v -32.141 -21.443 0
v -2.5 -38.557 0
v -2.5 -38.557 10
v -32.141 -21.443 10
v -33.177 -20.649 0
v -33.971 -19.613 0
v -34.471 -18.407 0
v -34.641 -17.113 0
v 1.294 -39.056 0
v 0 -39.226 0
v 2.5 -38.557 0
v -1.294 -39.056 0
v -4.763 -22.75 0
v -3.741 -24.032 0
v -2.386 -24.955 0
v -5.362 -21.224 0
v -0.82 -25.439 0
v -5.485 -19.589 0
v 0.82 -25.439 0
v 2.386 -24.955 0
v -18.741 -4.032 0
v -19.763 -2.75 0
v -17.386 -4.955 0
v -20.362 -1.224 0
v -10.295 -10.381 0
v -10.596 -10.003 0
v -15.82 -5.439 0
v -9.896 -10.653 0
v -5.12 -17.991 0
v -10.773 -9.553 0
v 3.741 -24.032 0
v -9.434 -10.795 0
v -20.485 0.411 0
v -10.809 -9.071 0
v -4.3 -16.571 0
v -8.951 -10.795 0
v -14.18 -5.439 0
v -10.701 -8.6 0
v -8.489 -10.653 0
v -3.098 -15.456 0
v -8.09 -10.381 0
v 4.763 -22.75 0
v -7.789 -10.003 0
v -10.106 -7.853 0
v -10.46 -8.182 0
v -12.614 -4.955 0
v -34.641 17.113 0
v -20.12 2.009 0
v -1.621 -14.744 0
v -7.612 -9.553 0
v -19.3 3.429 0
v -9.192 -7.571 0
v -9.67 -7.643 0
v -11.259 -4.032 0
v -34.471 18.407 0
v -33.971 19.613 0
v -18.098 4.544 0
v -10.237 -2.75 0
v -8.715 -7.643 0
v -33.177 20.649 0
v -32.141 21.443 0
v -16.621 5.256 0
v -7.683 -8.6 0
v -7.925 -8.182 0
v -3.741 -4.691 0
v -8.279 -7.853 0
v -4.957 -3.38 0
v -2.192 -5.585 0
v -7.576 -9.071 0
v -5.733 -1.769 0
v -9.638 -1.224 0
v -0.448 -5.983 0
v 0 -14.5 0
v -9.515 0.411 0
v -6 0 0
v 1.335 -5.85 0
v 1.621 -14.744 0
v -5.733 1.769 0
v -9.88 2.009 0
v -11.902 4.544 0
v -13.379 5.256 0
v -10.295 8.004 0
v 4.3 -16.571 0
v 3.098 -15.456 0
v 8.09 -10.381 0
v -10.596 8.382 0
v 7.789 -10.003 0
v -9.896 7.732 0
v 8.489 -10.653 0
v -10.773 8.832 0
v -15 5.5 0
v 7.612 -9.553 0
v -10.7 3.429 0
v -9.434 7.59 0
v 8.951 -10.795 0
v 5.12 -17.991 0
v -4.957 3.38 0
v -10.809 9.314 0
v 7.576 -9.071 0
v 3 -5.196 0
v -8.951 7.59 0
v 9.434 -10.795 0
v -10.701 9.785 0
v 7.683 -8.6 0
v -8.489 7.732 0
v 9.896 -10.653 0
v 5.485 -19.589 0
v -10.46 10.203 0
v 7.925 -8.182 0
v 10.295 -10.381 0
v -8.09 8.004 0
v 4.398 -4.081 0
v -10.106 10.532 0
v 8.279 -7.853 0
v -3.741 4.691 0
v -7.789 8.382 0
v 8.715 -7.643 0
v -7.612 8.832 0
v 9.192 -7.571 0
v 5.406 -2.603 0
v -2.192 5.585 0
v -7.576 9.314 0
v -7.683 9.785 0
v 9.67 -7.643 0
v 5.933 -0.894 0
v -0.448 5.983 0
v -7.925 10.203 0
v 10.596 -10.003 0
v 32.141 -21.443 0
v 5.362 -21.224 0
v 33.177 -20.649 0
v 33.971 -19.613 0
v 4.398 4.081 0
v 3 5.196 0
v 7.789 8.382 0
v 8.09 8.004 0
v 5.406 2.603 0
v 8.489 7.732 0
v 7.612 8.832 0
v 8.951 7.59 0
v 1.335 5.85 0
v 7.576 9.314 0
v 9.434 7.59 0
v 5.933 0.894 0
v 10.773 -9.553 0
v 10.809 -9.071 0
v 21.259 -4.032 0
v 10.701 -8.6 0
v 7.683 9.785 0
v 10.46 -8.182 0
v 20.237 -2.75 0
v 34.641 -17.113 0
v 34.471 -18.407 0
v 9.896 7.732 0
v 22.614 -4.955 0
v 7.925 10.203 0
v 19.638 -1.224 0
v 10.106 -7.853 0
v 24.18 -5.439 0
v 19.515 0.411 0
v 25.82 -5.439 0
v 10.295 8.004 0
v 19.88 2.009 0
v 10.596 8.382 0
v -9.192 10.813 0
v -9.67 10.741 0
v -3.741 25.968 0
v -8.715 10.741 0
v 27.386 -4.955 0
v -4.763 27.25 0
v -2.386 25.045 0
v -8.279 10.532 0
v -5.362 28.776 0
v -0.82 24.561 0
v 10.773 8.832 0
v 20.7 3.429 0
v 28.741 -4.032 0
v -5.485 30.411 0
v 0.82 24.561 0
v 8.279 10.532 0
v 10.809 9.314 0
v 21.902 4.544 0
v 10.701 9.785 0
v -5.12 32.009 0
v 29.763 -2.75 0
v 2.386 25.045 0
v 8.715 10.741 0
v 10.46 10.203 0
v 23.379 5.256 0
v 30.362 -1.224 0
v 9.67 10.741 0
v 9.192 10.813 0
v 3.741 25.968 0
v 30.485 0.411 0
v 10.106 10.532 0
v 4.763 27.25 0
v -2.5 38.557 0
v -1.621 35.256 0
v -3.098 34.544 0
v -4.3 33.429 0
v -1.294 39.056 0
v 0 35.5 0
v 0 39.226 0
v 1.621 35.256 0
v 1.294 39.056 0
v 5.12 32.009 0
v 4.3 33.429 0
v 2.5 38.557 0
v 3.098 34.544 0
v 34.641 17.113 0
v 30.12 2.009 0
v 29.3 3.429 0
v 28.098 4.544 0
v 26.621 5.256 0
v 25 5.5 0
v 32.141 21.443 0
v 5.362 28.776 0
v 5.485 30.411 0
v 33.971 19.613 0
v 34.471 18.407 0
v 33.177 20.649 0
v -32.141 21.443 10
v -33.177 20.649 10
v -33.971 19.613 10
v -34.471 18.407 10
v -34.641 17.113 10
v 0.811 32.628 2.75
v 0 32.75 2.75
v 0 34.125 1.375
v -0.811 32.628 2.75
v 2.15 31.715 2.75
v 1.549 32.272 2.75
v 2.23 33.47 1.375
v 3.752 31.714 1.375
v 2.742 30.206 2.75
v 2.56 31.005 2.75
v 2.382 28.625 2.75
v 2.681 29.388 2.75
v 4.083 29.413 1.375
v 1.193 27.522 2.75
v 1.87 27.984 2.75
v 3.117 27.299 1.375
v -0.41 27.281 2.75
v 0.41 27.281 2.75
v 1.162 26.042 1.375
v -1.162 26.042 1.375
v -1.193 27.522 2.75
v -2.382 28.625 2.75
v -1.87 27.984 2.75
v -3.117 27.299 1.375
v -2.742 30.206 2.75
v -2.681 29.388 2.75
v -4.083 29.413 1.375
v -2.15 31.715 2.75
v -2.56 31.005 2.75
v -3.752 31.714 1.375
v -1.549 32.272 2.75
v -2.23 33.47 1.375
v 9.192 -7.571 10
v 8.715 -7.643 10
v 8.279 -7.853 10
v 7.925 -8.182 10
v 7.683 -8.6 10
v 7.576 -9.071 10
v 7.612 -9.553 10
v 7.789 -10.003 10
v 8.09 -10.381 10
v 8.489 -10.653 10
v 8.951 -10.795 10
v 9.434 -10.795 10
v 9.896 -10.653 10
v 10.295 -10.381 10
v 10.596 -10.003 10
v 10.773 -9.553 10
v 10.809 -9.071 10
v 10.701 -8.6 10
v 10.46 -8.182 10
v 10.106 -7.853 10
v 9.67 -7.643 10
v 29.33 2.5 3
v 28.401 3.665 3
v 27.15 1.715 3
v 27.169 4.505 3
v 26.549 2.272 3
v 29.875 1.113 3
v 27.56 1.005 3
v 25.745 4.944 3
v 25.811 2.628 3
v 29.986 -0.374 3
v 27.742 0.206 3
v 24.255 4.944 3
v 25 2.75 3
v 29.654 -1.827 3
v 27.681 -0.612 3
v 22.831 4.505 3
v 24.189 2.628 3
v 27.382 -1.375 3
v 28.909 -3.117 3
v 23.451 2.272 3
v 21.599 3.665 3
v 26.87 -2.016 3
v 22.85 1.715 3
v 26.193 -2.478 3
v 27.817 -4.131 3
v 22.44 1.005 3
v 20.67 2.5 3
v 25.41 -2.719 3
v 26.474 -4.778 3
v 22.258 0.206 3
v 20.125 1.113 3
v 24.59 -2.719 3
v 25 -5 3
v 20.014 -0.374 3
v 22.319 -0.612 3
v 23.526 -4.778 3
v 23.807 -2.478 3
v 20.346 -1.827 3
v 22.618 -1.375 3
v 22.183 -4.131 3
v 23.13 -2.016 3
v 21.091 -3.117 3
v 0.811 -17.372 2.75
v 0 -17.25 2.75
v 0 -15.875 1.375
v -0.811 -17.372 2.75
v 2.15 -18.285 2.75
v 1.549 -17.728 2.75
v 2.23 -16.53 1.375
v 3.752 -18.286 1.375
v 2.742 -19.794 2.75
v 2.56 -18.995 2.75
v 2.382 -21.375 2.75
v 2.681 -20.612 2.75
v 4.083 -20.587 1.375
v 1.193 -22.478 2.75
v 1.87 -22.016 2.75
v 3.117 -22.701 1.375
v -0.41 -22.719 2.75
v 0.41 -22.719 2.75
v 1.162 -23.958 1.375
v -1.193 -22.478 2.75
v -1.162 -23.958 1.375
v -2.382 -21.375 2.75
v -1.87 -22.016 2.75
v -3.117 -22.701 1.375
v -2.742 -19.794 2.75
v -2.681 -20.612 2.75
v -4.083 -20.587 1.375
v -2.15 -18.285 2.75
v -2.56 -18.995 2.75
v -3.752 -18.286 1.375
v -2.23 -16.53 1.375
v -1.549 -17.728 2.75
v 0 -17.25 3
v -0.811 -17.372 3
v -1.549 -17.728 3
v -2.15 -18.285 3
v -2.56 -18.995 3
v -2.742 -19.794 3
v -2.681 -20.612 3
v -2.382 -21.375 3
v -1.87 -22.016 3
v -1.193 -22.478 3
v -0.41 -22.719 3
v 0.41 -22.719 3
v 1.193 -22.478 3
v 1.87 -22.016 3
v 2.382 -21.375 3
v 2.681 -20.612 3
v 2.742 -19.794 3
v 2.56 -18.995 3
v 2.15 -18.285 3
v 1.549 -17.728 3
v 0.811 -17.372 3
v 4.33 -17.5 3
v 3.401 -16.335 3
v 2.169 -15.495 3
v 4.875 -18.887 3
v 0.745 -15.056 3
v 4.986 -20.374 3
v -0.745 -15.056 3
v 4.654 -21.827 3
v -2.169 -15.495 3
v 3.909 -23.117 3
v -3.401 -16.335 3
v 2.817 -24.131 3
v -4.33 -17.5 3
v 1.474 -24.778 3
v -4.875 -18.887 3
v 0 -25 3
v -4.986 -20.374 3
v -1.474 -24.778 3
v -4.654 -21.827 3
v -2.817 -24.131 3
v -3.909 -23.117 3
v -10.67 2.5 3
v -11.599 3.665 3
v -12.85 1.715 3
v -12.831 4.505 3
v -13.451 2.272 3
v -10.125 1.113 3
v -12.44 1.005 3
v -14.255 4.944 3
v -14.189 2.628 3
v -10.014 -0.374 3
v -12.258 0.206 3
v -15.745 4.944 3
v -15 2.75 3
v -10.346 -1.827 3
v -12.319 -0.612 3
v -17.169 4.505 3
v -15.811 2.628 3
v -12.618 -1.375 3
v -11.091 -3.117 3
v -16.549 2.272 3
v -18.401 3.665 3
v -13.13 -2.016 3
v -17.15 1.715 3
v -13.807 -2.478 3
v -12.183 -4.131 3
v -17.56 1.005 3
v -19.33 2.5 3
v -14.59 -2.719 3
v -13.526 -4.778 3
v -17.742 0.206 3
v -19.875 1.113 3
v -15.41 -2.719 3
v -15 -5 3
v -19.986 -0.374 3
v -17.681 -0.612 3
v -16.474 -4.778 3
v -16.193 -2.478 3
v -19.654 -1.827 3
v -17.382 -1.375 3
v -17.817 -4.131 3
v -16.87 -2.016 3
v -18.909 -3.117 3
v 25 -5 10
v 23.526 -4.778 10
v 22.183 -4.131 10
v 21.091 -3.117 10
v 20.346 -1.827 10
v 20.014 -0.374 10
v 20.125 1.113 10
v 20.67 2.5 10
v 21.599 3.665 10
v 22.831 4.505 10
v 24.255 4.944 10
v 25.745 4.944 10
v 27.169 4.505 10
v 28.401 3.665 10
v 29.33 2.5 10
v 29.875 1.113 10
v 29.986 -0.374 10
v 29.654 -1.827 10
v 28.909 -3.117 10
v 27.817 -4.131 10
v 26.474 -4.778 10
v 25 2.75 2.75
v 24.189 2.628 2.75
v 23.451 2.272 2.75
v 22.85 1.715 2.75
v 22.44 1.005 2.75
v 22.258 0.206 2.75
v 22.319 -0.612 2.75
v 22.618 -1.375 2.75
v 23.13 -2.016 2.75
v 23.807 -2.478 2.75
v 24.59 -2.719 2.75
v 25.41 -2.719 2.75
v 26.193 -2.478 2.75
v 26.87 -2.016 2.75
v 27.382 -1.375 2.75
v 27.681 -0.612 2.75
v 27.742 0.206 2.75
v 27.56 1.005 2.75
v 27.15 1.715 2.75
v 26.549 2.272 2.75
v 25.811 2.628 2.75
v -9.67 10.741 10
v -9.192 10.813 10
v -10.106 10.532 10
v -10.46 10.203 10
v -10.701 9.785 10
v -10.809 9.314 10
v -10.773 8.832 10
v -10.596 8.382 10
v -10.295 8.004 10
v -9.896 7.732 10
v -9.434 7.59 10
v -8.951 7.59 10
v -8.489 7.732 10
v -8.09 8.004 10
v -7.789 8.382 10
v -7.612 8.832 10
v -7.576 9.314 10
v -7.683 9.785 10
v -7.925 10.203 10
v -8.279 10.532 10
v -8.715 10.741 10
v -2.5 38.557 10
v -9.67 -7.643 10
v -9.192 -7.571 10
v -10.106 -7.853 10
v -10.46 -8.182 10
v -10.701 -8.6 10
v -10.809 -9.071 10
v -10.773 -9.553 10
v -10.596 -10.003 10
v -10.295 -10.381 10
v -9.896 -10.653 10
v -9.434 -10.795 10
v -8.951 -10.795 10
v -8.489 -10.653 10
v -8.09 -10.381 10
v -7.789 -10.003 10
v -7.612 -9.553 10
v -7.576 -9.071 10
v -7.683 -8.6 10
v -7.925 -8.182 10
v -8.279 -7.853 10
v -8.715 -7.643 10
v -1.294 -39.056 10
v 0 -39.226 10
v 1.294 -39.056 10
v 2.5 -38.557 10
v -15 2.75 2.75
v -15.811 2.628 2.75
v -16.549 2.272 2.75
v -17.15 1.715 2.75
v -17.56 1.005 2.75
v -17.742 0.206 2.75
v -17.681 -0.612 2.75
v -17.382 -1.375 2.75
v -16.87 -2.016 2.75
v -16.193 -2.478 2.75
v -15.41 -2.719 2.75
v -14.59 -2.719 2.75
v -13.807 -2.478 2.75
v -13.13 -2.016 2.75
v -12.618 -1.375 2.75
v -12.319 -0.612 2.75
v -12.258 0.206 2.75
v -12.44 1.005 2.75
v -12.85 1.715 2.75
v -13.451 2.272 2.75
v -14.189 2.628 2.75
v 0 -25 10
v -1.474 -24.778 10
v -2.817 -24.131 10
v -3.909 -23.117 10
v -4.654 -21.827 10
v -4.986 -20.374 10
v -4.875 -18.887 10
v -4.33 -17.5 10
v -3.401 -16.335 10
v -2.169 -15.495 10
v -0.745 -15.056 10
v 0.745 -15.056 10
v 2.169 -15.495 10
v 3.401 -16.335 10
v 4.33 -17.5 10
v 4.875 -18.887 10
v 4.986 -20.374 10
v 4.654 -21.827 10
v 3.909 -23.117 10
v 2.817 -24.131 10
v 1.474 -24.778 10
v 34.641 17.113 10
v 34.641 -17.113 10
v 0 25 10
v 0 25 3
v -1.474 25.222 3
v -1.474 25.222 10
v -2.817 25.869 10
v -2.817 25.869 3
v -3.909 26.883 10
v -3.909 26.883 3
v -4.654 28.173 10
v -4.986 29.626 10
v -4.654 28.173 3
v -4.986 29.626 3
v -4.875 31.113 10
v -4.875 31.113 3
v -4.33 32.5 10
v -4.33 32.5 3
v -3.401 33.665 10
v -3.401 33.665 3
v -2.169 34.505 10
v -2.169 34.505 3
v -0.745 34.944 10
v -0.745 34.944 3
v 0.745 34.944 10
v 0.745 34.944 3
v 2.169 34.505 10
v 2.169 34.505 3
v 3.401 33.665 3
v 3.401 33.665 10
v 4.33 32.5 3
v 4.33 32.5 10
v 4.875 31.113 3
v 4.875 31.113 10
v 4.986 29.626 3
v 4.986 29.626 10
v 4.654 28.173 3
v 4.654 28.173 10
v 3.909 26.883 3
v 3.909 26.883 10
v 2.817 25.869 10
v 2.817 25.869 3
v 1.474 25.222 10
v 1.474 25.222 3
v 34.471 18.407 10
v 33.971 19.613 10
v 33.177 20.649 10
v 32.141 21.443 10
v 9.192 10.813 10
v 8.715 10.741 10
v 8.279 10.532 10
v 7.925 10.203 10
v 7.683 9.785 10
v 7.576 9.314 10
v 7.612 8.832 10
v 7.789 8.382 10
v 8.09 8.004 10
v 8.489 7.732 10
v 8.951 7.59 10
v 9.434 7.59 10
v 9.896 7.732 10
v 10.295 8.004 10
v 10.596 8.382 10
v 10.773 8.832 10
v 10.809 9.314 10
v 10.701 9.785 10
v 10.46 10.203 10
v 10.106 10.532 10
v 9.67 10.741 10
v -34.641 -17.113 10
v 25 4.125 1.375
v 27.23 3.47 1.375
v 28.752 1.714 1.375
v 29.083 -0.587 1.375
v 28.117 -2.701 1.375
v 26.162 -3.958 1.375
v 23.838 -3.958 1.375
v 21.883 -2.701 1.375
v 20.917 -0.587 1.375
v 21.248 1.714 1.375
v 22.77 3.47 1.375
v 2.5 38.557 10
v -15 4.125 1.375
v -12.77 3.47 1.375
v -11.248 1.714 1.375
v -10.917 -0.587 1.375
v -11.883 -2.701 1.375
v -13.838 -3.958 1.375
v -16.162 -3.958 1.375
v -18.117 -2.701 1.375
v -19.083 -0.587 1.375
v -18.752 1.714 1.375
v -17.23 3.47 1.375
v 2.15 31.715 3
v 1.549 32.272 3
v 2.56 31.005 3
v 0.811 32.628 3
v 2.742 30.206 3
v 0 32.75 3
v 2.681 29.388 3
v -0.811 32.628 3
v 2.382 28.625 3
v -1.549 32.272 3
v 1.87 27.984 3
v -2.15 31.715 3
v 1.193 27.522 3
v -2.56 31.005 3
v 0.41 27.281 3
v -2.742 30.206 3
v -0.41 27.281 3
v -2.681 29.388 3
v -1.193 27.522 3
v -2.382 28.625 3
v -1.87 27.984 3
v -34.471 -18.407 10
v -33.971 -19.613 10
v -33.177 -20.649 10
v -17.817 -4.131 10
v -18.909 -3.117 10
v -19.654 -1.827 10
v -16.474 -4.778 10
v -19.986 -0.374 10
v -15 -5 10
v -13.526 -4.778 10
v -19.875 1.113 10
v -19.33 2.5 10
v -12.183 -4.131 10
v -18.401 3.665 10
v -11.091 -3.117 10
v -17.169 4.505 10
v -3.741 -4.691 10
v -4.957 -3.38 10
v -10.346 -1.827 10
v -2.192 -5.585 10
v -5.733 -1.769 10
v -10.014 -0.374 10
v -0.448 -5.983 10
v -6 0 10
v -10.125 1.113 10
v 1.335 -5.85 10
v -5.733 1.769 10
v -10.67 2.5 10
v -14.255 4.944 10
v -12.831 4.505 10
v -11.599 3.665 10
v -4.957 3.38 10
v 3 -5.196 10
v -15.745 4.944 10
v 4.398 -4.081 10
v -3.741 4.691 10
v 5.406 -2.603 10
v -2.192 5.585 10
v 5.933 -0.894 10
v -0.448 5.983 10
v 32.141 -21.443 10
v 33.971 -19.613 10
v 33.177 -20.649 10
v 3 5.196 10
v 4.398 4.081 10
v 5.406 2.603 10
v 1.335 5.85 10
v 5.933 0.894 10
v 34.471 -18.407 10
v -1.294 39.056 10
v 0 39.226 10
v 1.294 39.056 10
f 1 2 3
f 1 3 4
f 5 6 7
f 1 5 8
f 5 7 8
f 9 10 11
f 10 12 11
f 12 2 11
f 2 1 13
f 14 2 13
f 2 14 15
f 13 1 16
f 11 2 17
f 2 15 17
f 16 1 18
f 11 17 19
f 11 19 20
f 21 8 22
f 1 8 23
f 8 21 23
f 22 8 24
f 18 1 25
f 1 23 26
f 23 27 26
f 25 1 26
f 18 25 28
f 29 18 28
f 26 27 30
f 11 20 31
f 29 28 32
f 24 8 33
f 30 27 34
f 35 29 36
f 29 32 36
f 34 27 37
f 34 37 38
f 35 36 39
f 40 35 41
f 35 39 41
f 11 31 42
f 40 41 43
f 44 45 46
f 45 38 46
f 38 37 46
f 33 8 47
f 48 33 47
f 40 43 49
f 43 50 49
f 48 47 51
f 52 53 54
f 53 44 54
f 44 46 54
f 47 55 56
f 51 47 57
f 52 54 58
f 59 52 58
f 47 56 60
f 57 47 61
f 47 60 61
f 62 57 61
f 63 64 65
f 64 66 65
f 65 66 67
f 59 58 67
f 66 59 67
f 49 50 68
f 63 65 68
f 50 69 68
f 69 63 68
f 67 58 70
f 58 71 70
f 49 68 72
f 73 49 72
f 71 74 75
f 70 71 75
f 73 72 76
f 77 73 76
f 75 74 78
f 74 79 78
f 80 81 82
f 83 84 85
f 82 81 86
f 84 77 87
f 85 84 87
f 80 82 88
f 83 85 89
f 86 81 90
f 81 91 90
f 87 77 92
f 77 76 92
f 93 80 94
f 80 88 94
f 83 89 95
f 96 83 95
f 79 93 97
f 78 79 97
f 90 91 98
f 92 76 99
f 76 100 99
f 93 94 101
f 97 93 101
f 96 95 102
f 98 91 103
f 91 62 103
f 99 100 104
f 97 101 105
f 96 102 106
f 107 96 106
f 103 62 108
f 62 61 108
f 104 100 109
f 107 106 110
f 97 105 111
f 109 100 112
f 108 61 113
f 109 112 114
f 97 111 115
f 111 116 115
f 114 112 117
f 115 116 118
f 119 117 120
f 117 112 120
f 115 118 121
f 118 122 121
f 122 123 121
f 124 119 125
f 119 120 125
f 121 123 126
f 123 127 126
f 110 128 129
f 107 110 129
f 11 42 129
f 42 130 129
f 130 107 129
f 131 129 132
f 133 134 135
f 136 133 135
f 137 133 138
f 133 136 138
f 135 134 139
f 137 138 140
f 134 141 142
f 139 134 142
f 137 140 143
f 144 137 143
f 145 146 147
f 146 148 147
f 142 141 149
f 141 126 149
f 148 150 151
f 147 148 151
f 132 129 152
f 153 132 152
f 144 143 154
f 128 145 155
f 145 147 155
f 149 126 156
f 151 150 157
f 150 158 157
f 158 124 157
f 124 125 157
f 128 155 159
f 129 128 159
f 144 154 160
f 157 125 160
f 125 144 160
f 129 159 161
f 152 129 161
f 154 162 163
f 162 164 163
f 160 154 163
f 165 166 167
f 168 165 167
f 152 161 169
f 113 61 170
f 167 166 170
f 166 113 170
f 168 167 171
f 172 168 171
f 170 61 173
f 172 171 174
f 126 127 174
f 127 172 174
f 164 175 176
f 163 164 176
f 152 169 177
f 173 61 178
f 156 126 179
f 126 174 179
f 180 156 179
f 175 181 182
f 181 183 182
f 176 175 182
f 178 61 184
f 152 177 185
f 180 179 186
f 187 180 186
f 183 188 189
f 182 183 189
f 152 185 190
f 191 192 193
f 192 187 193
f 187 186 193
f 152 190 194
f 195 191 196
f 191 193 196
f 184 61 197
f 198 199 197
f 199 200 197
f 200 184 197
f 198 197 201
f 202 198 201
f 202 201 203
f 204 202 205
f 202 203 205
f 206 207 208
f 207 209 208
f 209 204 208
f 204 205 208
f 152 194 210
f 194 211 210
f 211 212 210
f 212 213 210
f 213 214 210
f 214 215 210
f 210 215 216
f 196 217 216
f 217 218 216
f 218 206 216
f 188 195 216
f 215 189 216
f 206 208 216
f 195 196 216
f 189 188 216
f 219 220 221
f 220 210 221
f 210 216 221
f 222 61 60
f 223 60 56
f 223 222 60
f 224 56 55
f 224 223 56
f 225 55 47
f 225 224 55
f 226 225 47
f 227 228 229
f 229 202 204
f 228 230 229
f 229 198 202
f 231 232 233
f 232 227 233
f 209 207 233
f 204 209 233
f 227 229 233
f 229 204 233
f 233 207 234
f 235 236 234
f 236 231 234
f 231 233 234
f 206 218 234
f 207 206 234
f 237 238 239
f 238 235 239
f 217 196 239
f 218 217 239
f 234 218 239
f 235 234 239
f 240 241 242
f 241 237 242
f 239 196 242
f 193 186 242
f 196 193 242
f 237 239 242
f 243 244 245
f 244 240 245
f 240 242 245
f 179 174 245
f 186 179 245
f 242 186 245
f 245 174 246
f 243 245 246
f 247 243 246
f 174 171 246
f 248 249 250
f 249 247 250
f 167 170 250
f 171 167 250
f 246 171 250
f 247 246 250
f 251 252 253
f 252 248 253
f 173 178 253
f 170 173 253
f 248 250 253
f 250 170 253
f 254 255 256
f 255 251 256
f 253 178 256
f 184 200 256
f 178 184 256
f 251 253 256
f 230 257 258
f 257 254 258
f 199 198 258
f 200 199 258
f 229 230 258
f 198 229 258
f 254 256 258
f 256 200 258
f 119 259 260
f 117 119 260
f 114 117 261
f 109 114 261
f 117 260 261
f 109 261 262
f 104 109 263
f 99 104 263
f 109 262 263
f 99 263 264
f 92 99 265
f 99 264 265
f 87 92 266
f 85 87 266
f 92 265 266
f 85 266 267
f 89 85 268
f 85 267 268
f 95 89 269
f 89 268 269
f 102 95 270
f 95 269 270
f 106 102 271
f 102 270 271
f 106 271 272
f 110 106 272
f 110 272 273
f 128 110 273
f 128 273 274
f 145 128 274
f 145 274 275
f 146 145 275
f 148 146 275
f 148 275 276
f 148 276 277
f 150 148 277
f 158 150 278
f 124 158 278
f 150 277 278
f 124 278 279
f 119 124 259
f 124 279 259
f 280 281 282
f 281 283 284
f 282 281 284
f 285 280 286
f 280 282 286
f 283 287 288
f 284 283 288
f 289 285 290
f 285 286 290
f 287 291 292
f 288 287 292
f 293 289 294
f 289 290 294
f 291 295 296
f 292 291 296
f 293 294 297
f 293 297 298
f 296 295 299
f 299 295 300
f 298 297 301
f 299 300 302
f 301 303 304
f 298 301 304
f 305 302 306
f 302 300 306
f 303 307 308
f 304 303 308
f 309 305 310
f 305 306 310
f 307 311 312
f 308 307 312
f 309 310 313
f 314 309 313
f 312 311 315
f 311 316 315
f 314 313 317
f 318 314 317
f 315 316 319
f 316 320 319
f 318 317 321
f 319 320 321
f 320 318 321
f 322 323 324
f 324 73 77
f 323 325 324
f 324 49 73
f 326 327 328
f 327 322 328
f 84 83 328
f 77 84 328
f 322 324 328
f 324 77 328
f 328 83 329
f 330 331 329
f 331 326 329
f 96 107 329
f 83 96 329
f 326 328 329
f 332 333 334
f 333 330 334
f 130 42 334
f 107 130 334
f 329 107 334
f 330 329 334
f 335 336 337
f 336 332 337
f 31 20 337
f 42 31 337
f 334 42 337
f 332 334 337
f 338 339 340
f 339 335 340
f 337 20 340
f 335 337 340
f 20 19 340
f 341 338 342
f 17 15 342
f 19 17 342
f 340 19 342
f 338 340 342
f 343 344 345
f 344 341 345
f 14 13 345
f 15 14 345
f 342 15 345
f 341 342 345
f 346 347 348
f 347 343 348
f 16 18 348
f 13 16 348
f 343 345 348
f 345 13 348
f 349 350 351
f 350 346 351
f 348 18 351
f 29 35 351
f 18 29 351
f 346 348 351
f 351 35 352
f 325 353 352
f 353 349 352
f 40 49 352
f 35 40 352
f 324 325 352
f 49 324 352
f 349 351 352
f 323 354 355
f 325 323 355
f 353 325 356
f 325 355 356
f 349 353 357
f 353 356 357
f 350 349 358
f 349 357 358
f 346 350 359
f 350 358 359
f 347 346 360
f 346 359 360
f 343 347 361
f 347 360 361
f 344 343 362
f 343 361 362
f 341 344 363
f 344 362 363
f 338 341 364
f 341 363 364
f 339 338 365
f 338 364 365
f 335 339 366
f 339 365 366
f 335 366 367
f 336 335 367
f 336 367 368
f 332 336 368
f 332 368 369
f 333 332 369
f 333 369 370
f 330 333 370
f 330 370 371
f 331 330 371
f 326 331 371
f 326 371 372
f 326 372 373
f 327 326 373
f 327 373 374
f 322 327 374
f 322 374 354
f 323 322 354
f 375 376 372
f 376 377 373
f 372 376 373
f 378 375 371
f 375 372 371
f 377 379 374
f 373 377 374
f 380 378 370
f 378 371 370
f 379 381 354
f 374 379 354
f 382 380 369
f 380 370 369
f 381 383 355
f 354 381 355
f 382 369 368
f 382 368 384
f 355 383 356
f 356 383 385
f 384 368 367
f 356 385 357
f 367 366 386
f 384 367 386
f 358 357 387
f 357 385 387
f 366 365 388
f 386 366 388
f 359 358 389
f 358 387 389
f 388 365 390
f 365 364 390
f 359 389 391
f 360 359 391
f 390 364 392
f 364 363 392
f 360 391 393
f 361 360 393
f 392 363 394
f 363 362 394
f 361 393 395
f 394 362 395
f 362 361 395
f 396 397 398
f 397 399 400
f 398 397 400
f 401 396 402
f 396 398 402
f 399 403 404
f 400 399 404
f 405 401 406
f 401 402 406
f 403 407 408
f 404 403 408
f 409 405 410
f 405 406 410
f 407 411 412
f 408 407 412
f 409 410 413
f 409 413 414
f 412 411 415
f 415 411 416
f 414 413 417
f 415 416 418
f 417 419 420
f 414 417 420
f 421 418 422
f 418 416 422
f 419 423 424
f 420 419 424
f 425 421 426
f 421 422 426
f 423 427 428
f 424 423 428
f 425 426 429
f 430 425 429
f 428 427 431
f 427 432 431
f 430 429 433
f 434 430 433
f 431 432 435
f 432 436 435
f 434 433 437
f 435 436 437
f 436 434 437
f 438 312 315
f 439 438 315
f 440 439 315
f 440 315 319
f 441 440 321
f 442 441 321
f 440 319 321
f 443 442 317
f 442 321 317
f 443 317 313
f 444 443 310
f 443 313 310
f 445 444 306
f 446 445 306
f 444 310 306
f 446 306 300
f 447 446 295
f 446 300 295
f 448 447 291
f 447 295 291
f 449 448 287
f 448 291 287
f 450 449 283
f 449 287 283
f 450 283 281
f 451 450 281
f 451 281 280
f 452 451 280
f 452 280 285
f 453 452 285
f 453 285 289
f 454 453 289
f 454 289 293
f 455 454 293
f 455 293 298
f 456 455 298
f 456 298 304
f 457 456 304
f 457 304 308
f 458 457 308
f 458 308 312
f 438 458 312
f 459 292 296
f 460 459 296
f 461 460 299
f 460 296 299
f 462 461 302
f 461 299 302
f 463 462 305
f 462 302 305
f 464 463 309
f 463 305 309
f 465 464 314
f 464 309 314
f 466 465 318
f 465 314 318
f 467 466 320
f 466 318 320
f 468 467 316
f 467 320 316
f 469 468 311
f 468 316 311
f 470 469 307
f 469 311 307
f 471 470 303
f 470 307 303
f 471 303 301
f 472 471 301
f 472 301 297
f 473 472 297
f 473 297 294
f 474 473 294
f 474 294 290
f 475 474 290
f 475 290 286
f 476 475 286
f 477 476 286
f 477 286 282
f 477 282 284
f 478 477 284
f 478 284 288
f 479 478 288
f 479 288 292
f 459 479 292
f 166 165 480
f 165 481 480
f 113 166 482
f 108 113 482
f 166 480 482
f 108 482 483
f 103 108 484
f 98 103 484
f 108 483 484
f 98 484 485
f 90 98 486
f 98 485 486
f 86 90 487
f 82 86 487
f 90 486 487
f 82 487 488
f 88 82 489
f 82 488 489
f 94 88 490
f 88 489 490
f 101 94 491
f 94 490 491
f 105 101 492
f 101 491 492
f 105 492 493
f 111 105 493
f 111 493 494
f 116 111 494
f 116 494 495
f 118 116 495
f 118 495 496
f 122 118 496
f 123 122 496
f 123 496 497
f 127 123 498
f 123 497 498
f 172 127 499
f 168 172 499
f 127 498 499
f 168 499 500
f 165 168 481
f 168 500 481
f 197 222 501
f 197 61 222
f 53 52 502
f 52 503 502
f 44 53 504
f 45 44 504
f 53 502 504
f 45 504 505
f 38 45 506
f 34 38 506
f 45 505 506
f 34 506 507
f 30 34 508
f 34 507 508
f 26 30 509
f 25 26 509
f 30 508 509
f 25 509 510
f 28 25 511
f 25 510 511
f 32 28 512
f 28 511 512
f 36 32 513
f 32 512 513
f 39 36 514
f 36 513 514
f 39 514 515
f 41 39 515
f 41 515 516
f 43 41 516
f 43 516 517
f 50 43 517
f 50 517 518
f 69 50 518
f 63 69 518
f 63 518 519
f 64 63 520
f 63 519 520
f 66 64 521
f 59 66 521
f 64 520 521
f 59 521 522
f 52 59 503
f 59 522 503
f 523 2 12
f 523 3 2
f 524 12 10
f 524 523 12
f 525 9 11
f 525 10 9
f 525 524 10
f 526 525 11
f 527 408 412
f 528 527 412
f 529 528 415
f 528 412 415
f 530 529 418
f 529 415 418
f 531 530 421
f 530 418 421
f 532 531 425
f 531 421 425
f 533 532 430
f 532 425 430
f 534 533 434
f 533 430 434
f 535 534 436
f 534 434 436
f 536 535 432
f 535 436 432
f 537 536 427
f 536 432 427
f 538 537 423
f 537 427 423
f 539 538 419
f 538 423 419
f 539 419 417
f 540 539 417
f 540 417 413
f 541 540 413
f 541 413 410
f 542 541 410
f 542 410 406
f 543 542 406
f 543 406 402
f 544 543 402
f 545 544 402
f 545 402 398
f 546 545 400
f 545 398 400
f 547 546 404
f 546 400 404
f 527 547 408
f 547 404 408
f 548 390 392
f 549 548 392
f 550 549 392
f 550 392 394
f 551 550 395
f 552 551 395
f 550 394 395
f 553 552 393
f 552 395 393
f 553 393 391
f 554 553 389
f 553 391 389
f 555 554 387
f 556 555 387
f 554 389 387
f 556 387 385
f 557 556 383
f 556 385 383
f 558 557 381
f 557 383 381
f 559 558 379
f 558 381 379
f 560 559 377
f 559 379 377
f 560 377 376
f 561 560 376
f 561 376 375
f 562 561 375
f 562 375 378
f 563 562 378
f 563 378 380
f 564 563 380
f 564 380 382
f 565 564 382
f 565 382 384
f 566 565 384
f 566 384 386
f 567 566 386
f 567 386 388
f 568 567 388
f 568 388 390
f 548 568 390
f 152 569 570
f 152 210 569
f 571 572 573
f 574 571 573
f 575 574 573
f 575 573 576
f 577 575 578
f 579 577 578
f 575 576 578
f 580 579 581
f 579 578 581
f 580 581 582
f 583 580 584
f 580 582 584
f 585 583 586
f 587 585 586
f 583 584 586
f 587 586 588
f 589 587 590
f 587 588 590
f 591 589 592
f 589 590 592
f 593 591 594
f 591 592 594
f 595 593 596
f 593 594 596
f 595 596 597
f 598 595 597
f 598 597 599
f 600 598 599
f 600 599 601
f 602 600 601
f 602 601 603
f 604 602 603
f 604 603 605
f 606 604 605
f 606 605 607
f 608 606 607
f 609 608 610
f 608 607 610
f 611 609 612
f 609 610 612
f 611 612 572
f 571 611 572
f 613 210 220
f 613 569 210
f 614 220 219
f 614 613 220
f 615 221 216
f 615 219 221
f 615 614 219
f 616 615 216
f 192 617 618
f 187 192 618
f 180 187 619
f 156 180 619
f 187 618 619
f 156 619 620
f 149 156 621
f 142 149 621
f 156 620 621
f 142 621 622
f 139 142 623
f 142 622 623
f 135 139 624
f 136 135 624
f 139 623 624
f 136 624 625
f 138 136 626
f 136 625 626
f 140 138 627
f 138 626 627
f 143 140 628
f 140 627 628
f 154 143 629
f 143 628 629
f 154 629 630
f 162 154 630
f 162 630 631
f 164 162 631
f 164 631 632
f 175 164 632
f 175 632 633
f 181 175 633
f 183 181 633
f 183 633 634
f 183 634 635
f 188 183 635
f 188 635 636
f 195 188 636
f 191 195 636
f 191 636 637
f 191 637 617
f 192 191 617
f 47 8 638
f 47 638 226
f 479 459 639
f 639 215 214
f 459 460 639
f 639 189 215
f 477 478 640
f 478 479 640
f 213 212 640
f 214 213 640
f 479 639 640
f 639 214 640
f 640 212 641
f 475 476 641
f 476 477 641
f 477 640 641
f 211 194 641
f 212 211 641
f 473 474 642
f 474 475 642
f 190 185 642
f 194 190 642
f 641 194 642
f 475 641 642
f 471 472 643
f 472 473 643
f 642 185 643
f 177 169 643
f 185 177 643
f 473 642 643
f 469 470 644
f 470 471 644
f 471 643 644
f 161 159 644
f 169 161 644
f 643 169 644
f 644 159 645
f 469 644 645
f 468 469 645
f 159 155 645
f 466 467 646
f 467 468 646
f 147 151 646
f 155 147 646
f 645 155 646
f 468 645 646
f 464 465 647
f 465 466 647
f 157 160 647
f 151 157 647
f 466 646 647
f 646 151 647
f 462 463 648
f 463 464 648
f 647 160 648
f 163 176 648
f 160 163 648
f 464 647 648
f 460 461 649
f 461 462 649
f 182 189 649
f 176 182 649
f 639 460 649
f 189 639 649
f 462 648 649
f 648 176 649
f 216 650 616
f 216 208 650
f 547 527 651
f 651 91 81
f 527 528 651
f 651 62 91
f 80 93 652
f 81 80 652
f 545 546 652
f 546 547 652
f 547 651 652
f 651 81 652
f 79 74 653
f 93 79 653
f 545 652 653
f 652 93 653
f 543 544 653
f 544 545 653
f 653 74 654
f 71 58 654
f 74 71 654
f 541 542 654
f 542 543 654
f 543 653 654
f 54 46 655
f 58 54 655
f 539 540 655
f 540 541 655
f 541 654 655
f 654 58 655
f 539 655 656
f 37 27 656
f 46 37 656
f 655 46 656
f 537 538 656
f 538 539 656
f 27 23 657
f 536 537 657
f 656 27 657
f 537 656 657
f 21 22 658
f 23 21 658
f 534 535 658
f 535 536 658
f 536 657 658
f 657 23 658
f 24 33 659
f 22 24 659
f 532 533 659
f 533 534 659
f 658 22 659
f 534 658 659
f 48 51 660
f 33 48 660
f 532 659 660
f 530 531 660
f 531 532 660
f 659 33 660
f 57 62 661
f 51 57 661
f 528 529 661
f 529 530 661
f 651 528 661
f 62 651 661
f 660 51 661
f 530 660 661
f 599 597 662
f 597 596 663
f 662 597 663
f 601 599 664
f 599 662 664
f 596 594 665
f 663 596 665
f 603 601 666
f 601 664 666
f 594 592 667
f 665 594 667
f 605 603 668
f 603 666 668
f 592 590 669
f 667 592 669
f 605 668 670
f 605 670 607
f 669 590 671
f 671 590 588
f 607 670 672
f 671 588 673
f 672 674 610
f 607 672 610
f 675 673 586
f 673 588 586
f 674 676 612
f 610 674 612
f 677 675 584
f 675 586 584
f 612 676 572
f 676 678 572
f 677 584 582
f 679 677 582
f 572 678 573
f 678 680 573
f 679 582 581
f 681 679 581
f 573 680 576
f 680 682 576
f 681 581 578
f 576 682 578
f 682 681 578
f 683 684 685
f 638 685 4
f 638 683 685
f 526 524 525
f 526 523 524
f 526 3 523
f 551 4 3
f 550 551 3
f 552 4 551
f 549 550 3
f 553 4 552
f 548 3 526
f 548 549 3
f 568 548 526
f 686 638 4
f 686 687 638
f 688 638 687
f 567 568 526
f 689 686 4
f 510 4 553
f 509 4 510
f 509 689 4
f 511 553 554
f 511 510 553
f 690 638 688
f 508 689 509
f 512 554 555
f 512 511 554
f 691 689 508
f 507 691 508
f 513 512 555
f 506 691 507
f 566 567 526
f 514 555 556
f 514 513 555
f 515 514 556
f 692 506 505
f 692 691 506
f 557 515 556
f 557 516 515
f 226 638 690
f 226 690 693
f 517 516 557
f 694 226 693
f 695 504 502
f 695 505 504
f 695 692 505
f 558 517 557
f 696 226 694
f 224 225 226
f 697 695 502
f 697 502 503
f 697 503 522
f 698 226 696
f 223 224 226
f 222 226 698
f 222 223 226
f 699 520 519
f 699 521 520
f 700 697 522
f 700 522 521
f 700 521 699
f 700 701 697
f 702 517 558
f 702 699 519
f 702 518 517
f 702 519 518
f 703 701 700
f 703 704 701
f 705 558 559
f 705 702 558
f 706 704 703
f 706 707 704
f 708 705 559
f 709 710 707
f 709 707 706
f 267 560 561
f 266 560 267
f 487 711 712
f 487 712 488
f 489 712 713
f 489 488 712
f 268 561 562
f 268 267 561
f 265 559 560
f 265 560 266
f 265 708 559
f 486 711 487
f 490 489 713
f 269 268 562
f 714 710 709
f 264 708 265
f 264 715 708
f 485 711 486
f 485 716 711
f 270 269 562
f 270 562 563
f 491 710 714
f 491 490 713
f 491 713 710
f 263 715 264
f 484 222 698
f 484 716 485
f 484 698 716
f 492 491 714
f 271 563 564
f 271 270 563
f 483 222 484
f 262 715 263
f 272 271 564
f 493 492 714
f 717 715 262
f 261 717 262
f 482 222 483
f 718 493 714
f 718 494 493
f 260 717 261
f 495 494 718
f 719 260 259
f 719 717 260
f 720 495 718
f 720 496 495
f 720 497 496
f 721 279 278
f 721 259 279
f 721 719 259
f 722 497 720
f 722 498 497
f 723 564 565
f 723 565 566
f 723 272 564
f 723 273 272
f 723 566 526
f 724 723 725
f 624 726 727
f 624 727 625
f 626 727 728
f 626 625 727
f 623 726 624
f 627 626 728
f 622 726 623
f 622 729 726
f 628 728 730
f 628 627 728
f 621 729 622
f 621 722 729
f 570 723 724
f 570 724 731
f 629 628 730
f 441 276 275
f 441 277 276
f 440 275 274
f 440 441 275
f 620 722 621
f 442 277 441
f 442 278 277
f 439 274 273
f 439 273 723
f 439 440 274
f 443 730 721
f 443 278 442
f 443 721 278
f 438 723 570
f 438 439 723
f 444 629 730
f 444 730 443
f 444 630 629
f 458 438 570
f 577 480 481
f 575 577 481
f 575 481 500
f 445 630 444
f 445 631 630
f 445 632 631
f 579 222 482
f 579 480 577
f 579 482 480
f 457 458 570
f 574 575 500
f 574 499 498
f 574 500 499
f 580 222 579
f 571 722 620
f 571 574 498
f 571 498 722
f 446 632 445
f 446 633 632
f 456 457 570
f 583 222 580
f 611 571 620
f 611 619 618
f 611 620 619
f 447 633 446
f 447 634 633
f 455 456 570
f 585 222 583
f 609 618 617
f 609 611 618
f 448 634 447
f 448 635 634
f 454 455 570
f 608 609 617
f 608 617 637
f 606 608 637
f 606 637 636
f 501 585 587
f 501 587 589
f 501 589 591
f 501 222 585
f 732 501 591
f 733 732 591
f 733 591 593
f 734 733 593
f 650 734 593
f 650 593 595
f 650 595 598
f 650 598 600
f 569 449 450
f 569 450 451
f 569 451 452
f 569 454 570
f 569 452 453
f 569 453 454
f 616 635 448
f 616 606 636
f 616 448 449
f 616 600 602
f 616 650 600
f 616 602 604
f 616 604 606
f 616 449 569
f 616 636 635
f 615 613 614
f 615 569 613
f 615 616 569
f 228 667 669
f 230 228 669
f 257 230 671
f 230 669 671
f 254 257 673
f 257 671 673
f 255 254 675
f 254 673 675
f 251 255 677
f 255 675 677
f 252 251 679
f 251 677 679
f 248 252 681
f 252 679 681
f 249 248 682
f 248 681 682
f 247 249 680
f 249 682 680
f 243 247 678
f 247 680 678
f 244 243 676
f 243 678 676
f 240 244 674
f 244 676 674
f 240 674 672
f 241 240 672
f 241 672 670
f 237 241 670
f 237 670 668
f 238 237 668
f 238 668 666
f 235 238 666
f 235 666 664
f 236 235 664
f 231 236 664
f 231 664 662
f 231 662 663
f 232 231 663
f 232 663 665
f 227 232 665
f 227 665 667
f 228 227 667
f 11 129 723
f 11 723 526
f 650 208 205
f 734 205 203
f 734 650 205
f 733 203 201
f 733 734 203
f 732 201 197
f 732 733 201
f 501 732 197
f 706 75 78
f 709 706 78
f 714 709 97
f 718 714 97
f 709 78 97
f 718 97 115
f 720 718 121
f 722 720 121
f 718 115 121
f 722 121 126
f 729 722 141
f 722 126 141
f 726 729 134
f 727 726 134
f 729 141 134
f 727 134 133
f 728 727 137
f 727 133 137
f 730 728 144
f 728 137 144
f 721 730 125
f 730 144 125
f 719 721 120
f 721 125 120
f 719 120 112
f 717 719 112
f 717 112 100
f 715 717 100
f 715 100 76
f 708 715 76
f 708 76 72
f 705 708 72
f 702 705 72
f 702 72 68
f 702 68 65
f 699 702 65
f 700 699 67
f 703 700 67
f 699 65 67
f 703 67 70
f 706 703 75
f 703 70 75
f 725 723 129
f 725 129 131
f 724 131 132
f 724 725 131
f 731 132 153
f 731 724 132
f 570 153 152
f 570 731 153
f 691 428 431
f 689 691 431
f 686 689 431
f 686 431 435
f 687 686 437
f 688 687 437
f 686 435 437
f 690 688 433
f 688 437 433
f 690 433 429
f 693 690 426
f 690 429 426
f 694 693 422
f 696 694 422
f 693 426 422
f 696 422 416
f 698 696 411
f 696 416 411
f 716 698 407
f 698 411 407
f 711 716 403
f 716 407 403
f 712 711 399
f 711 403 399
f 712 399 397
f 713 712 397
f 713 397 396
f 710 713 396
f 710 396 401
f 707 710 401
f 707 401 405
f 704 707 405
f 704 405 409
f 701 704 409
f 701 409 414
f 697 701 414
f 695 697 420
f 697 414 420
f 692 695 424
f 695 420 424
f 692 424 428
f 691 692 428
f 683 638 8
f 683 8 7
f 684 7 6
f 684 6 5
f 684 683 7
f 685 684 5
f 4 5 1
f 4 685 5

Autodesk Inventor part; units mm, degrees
ref_plane "YZ Plane" through (0, 0, 0) normal (1, 0, 0) x (0, 1, 0)
ref_plane "XZ Plane" through (0, 0, 0) normal (0, 1, 0) x (-1, 0, 0)
ref_plane "XY Plane" through (0, 0, 0) normal (0, 0, 1) x (1, 0, 0)
sketch "スケッチ1" plane through (0, 0, 0) normal (0, 0, 1) x (1, 0, 0)
  line L0 (0, 40) -> (34.641, 20)
  line L1 (34.641, 20) -> (34.641, -20)
  line L2 (34.641, -20) -> (0, -40)
  line L3 (0, -40) -> (-34.641, -20)
  line L4 (-34.641, -20) -> (-34.641, 20)
  line L5 (-34.641, 20) -> (0, 40)
  point P0 (0, 0)
  point P1 (0, 0)
  dimension "d0" = 40
extrude "押し出し1" add sketch "スケッチ1" along normal blind 10
sketch "スケッチ2" plane through (0, 0, 10) normal (0, 0, 1) x (1, 0, 0)
  line L0 (0, -40) -> (34.641, -20) projected
  line L1 (34.641, -20) -> (34.641, 20) projected
  line L2 (34.641, 20) -> (0, 40) projected
  line L3 (0, 40) -> (-34.641, 20) projected
  line L4 (-34.641, 20) -> (-34.641, -20) projected
  line L5 (-34.641, -20) -> (0, -40) projected
  point P0 (0, 0)
  point P1 (0, 30)
  point P2 (25, 0)
  point P3 (0, -20)
  point P4 (-15, 0)
  dimension "d3" = 30
  dimension "d4" = 25
  dimension "d5" = 20
  dimension "d6" = 15
hole "穴1" at (0, 30, 10) at (25, 0, 10) at (0, -20, 10) at (-15, 0, 10) direction (0, 0, -1) diameter 4.2 depth 10 counterbore diameter 10 counterbore depth 7
sketch "スケッチ3" plane through (0, 0, 0) normal (0, 0, -1) x (-1, 0, 0)
  circle A0 centre (0, -20) radius 2.1 projected
  circle A1 centre (0, 30) radius 2.1 projected
  circle A2 centre (-25, 0) radius 2.1 projected
  circle A3 centre (15, 0) radius 2.1 projected
  line L0 (0, -40) -> (-34.641, -20) projected
  line L1 (34.641, -20) -> (0, -40) projected
  line L2 (34.641, 20) -> (34.641, -20) projected
  line L3 (0, 40) -> (34.641, 20) projected
  line L4 (-34.641, 20) -> (0, 40) projected
  line L5 (-34.641, -20) -> (-34.641, 20) projected
  circle A4 centre (0, 0) radius 13
  point P0 (9.1924, -9.1924)
  point P1 (9.1924, 9.1924)
  point P2 (-9.1924, 9.1924)
  point P3 (-9.1924, -9.1924)
  dimension "d14" = 26
  dimension "d17" = 360
hole "穴2" at (-9.1924, -9.1924, 0) at (-9.1924, 9.1924, 0) at (9.1924, 9.1924, 0) at (9.1924, -9.1924, 0) direction (0, 0, 1) diameter 3.242 depth 12 thread size "M4x0.7" class "6H" standard "ISO Metric profile"
sketch "スケッチ4" plane through (0, 0, 0) normal (0, 0, -1) x (-1, 0, 0)
  circle A0 centre (-9.1924, 9.1924) radius 1.621 projected
  circle A1 centre (9.1924, -9.1924) radius 1.621 projected
  circle A2 centre (9.1924, 9.1924) radius 1.621 projected
  circle A3 centre (-9.1924, -9.1924) radius 1.621 projected
  circle A4 centre (0, -20) radius 2.1 projected
  circle A5 centre (0, 30) radius 2.1 projected
  circle A6 centre (-25, 0) radius 2.1 projected
  circle A7 centre (15, 0) radius 2.1 projected
  line L0 (0, -40) -> (-34.641, -20) projected
  line L1 (34.641, -20) -> (0, -40) projected
  line L2 (34.641, 20) -> (34.641, -20) projected
  line L3 (0, 40) -> (34.641, 20) projected
  line L4 (-34.641, 20) -> (0, 40) projected
  line L5 (-34.641, -20) -> (-34.641, 20) projected
  point P0 (0, 0)
hole "穴3" at (0, 30, 0) at (-15, 0, 0) at (0, -20, 0) at (25, 0, 0) direction (0, 0, 1) diameter 5.5 depth 12 countersink diameter 11 countersink angle 90
sketch "スケッチ5" plane through (0, 0, 0) normal (0, 0, -1) x (-1, 0, 0)
  circle A0 centre (0, 0) radius 6
  dimension "d33" = 12
extrude "押し出し2" cut sketch "スケッチ5" against normal blind 10
fillet "フィレット1" radius 5 6 edges at (0, 40, 5) (-34.641, 20, 5) (-34.641, -20, 5) (0, -40, 5) (34.641, -20, 5) (34.641, 20, 5)
properties part number "Flange"
